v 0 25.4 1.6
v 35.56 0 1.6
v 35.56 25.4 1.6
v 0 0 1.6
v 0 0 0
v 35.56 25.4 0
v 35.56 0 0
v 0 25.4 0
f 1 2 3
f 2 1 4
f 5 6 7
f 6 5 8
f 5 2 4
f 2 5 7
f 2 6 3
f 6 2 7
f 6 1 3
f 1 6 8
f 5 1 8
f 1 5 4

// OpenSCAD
$fn = 64;

pcb_length = 35.56;   // mm
pcb_width  = 25.4;    // mm
pcb_thick  = 1.6;     // mm

color([0.0, 0.45, 0.2])
cube([pcb_length, pcb_width, pcb_thick], center=false);
